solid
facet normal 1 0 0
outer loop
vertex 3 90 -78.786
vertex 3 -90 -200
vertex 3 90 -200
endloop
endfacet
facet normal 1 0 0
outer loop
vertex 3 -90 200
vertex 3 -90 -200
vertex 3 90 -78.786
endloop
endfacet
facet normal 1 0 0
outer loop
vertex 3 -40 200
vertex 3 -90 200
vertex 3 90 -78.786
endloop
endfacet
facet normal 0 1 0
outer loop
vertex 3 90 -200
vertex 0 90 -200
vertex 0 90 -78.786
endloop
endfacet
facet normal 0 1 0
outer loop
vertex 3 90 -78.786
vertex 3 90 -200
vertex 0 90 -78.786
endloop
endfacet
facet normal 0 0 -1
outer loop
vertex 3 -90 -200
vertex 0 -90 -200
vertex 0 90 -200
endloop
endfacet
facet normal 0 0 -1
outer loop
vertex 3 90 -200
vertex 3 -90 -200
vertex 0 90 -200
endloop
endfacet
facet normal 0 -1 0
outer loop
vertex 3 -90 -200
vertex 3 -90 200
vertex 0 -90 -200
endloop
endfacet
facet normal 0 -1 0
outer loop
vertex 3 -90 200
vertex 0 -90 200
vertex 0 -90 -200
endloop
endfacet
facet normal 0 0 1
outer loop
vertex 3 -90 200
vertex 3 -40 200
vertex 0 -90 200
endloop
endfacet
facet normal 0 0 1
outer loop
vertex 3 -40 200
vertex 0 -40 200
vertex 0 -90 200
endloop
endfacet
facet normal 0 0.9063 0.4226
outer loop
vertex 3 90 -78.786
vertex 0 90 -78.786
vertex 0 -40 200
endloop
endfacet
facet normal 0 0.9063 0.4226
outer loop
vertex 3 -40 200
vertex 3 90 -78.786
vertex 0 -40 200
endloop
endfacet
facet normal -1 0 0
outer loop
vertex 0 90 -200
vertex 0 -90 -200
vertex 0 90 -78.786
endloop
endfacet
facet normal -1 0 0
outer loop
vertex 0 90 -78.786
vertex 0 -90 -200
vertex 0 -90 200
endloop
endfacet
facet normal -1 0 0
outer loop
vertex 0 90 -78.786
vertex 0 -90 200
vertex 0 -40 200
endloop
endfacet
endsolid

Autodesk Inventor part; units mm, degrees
ref_plane "YZ Plane" through (0, 0, 0) normal (1, 0, 0) x (0, 1, 0)
ref_plane "XZ Plane" through (0, 0, 0) normal (0, 1, 0) x (-1, 0, 0)
ref_plane "XY Plane" through (0, 0, 0) normal (0, 0, 1) x (1, 0, 0)
sketch "スケッチ1" plane through (0, 0, 0) normal (1, 0, 0) x (0, 1, 0)
  line L0 (-40, 200) -> (-90, 200)
  line L1 (-90, 200) -> (-90, -200)
  line L2 (-90, -200) -> (90, -200)
  line L3 (90, -200) -> (90, -78.7859)
  line L4 (90, -78.7859) -> (-40, 200)
  line L5 (-126, 0) -> (126, 0) projected
  line L6 (0, -280) -> (0, 280) projected
  point P0 (0, 0)
  point P1 (-90, 0)
  point P2 (0, -200)
  dimension "d0" = 400
  dimension "d1" = 50
  dimension "d2" = 180
  dimension "d3" = 25
extrude "押し出し1" add sketch "スケッチ1" along normal blind 3
properties part number "stay" material "アルミニウム 6061"
